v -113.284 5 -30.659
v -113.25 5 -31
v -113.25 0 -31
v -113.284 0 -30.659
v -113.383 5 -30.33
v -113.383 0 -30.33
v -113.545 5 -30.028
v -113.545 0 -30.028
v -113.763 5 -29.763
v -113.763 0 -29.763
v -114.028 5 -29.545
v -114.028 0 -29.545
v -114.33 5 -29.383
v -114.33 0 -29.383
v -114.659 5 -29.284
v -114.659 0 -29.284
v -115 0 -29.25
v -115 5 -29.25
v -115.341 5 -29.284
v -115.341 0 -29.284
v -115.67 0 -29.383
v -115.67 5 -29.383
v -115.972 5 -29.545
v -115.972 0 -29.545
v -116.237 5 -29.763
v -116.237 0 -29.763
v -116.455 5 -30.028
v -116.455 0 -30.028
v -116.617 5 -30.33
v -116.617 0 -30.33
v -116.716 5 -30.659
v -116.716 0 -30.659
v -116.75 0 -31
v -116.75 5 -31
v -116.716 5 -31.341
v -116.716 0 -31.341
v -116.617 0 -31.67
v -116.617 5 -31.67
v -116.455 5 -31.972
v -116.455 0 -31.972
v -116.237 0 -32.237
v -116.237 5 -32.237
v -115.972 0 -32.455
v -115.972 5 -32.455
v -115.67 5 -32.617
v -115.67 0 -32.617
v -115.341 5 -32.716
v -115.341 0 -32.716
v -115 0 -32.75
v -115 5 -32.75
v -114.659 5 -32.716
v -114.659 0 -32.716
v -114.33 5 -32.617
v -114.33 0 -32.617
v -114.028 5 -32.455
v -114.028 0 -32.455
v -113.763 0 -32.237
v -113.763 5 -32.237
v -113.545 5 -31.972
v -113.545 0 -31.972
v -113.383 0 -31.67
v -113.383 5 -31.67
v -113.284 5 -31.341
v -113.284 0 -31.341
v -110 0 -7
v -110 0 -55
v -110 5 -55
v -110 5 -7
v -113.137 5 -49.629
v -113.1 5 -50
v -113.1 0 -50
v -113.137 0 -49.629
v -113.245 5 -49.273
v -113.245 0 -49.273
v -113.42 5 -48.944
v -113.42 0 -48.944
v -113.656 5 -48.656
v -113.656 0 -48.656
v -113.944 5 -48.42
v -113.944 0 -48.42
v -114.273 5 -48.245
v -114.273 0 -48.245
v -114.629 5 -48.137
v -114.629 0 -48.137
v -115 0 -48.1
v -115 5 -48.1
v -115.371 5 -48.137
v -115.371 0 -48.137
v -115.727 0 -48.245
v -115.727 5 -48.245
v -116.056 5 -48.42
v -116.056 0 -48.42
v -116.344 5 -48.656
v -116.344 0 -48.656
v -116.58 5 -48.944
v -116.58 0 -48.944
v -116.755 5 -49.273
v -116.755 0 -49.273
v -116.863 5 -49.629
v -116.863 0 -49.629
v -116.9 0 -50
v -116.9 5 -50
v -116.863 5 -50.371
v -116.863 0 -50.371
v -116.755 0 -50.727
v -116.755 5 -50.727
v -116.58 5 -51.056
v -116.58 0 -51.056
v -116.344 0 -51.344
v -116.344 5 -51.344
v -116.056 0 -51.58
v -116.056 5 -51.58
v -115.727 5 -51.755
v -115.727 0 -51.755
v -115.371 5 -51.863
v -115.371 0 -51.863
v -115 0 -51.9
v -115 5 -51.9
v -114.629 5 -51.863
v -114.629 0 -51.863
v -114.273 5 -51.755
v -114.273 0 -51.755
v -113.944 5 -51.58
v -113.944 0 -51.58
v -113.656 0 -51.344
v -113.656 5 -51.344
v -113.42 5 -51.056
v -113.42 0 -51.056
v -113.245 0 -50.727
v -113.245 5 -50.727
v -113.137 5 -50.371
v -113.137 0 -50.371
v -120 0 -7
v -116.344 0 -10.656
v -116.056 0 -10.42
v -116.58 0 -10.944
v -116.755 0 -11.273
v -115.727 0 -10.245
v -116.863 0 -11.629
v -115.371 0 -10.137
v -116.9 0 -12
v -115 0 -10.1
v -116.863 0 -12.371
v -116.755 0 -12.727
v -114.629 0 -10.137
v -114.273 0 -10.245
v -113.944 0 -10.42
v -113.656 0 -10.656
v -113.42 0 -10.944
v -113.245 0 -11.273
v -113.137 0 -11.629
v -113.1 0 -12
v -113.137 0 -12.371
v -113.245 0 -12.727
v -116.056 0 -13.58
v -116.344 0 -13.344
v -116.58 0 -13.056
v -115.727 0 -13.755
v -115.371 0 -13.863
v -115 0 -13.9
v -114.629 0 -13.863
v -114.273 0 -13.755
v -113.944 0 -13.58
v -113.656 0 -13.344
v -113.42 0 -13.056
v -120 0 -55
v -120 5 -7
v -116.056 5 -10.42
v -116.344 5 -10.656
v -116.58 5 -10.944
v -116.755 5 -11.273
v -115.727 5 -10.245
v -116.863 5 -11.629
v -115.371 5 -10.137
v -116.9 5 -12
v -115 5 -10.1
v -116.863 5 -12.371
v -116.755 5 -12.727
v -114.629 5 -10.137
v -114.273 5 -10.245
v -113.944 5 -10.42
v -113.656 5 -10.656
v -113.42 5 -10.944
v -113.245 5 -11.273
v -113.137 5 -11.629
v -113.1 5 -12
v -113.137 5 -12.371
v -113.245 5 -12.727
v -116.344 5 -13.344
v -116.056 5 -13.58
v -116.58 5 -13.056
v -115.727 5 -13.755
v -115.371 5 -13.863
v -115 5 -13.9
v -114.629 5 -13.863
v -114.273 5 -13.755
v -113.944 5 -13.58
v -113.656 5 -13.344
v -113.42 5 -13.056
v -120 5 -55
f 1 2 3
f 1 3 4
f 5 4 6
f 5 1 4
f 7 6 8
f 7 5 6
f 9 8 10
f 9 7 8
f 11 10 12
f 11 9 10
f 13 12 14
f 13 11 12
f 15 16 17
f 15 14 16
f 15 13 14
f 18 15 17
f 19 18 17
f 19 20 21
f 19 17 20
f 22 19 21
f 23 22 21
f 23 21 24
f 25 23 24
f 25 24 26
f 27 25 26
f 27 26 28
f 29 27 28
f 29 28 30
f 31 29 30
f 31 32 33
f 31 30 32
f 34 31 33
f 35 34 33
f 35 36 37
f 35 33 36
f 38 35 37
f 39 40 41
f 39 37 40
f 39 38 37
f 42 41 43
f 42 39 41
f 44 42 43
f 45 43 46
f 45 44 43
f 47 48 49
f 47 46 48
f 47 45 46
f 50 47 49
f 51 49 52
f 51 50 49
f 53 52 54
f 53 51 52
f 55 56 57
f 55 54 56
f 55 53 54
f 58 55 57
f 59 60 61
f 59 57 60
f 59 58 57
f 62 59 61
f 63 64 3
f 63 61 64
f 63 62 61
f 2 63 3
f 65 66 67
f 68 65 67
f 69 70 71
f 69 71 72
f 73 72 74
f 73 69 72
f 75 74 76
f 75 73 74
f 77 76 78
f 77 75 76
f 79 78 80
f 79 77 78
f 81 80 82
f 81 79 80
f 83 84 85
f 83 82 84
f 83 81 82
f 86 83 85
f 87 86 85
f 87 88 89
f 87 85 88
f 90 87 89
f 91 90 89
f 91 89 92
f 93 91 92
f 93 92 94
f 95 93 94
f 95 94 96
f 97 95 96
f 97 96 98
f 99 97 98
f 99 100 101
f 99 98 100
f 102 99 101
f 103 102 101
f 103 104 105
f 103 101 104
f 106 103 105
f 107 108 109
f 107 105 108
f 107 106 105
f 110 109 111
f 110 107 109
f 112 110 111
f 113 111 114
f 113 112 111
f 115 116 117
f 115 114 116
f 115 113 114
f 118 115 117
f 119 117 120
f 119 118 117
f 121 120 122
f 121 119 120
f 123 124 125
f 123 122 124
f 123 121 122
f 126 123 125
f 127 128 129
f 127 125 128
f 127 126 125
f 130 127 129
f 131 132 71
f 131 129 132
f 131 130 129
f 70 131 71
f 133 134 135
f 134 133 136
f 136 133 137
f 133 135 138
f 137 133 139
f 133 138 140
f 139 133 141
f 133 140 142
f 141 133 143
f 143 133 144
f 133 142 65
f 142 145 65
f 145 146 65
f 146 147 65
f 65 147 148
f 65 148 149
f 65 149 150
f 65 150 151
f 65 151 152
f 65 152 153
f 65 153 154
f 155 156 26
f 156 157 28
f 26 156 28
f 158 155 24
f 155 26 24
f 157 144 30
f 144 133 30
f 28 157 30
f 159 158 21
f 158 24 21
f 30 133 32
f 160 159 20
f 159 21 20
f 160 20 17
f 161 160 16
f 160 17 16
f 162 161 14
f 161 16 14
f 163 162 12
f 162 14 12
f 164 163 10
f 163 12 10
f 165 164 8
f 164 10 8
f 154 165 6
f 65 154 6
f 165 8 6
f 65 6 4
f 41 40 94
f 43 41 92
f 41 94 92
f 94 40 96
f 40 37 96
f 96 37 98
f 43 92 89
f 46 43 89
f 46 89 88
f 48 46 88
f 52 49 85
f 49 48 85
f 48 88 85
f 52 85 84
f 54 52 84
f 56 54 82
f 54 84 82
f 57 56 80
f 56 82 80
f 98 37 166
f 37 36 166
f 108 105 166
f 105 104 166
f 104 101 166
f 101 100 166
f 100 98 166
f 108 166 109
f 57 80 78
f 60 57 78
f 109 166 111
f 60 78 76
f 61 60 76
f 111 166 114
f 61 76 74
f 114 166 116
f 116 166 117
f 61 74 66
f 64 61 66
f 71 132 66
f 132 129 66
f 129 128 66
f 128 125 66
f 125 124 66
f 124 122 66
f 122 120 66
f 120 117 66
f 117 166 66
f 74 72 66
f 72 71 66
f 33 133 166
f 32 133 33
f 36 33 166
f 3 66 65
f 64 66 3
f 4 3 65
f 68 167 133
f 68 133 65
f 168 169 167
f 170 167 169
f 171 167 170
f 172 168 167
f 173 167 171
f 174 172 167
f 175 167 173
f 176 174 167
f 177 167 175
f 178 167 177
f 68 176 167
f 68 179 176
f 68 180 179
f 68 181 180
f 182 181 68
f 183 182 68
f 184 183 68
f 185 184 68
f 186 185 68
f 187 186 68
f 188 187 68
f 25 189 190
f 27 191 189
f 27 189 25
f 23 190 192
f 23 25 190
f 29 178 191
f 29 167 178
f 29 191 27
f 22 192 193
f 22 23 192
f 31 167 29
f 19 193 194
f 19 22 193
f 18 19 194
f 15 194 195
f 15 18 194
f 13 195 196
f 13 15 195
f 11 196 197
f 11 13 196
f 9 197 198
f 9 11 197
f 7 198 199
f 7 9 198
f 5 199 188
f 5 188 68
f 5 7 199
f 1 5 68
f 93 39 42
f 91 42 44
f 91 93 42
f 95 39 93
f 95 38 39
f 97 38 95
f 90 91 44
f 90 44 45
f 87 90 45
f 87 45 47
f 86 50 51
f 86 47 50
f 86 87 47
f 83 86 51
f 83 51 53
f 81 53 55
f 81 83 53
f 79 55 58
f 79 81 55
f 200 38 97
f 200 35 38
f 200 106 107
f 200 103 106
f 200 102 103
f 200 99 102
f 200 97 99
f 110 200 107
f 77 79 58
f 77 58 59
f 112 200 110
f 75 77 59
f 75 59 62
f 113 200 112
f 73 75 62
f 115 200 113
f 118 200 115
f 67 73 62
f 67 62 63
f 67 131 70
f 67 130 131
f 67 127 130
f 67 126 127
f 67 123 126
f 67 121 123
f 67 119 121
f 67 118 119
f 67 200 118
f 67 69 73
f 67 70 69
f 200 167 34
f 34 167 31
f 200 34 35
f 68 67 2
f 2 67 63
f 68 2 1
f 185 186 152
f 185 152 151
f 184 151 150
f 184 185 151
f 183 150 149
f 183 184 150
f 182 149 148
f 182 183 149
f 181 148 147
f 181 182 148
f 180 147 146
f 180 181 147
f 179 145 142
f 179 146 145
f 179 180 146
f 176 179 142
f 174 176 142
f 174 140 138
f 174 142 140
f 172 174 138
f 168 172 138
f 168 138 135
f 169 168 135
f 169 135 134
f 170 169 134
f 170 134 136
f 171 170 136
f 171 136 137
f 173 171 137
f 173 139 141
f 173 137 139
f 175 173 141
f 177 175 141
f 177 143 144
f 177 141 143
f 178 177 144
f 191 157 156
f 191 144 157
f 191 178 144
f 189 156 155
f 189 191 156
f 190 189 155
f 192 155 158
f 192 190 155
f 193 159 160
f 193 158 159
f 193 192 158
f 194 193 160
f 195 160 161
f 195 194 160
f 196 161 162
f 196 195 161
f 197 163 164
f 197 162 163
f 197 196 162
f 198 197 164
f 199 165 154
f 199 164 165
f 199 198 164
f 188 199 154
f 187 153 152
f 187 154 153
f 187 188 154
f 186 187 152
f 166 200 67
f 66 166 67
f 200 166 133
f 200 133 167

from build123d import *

# Parameters (mm, degrees)
CYLINDER049_R     = 1.9
CYLINDER049_DEPTH = 10
CYLINDER050_R     = 1.9
CYLINDER050_DEPTH = 10
CYLINDER048_R     = 1.75
CYLINDER048_DEPTH = 10
BOX007_W          = 10
BOX007_H          = 5
BOX007_DEPTH      = 48


with BuildPart() as cylinder049:
    # Cylinder049 → Cylinder049 (new body)
    with BuildSketch(Plane(origin=(-115, 0, -50), x_dir=(1, 0, 0), z_dir=(0, -1, 0))):
        Circle(CYLINDER049_R)
    extrude(amount=CYLINDER049_DEPTH)


with BuildPart() as cylinder050:
    # Cylinder050 → Cylinder050 (new body)
    with BuildSketch(Plane(origin=(-115, 0, -12), x_dir=(1, 0, 0), z_dir=(0, -1, 0))):
        Circle(CYLINDER050_R)
    extrude(amount=CYLINDER050_DEPTH)


with BuildPart() as sidecuts:
    # Cylinder048 → Cylinder048 (new body)
    with BuildSketch(Plane(origin=(-115, 0, -31), x_dir=(1, 0, 0), z_dir=(0, -1, 0))):
        Circle(CYLINDER048_R)
    extrude(amount=CYLINDER048_DEPTH)

    # Fusion017: union Cylinder049, Cylinder050
    add(cylinder049.part)
    add(cylinder050.part)


with BuildPart() as sidecuts_1:
    # Fusion017 placement: moved
    add(sidecuts.part.moved(Location((0, 9.8, 0))))


with BuildPart() as cornerbase:
    # Box007 → Box007 (new body)
    with BuildSketch(Plane(origin=(-120, 0, -55), x_dir=(1, 0, 0), z_dir=(0, 0, 1))):
        with Locations((5, 2.5)):
            Rectangle(BOX007_W, BOX007_H)
    extrude(amount=BOX007_DEPTH)

    # Cut001: cut sideCuts
    add(sidecuts_1.part, mode=Mode.SUBTRACT)


solid = cornerbase.part
